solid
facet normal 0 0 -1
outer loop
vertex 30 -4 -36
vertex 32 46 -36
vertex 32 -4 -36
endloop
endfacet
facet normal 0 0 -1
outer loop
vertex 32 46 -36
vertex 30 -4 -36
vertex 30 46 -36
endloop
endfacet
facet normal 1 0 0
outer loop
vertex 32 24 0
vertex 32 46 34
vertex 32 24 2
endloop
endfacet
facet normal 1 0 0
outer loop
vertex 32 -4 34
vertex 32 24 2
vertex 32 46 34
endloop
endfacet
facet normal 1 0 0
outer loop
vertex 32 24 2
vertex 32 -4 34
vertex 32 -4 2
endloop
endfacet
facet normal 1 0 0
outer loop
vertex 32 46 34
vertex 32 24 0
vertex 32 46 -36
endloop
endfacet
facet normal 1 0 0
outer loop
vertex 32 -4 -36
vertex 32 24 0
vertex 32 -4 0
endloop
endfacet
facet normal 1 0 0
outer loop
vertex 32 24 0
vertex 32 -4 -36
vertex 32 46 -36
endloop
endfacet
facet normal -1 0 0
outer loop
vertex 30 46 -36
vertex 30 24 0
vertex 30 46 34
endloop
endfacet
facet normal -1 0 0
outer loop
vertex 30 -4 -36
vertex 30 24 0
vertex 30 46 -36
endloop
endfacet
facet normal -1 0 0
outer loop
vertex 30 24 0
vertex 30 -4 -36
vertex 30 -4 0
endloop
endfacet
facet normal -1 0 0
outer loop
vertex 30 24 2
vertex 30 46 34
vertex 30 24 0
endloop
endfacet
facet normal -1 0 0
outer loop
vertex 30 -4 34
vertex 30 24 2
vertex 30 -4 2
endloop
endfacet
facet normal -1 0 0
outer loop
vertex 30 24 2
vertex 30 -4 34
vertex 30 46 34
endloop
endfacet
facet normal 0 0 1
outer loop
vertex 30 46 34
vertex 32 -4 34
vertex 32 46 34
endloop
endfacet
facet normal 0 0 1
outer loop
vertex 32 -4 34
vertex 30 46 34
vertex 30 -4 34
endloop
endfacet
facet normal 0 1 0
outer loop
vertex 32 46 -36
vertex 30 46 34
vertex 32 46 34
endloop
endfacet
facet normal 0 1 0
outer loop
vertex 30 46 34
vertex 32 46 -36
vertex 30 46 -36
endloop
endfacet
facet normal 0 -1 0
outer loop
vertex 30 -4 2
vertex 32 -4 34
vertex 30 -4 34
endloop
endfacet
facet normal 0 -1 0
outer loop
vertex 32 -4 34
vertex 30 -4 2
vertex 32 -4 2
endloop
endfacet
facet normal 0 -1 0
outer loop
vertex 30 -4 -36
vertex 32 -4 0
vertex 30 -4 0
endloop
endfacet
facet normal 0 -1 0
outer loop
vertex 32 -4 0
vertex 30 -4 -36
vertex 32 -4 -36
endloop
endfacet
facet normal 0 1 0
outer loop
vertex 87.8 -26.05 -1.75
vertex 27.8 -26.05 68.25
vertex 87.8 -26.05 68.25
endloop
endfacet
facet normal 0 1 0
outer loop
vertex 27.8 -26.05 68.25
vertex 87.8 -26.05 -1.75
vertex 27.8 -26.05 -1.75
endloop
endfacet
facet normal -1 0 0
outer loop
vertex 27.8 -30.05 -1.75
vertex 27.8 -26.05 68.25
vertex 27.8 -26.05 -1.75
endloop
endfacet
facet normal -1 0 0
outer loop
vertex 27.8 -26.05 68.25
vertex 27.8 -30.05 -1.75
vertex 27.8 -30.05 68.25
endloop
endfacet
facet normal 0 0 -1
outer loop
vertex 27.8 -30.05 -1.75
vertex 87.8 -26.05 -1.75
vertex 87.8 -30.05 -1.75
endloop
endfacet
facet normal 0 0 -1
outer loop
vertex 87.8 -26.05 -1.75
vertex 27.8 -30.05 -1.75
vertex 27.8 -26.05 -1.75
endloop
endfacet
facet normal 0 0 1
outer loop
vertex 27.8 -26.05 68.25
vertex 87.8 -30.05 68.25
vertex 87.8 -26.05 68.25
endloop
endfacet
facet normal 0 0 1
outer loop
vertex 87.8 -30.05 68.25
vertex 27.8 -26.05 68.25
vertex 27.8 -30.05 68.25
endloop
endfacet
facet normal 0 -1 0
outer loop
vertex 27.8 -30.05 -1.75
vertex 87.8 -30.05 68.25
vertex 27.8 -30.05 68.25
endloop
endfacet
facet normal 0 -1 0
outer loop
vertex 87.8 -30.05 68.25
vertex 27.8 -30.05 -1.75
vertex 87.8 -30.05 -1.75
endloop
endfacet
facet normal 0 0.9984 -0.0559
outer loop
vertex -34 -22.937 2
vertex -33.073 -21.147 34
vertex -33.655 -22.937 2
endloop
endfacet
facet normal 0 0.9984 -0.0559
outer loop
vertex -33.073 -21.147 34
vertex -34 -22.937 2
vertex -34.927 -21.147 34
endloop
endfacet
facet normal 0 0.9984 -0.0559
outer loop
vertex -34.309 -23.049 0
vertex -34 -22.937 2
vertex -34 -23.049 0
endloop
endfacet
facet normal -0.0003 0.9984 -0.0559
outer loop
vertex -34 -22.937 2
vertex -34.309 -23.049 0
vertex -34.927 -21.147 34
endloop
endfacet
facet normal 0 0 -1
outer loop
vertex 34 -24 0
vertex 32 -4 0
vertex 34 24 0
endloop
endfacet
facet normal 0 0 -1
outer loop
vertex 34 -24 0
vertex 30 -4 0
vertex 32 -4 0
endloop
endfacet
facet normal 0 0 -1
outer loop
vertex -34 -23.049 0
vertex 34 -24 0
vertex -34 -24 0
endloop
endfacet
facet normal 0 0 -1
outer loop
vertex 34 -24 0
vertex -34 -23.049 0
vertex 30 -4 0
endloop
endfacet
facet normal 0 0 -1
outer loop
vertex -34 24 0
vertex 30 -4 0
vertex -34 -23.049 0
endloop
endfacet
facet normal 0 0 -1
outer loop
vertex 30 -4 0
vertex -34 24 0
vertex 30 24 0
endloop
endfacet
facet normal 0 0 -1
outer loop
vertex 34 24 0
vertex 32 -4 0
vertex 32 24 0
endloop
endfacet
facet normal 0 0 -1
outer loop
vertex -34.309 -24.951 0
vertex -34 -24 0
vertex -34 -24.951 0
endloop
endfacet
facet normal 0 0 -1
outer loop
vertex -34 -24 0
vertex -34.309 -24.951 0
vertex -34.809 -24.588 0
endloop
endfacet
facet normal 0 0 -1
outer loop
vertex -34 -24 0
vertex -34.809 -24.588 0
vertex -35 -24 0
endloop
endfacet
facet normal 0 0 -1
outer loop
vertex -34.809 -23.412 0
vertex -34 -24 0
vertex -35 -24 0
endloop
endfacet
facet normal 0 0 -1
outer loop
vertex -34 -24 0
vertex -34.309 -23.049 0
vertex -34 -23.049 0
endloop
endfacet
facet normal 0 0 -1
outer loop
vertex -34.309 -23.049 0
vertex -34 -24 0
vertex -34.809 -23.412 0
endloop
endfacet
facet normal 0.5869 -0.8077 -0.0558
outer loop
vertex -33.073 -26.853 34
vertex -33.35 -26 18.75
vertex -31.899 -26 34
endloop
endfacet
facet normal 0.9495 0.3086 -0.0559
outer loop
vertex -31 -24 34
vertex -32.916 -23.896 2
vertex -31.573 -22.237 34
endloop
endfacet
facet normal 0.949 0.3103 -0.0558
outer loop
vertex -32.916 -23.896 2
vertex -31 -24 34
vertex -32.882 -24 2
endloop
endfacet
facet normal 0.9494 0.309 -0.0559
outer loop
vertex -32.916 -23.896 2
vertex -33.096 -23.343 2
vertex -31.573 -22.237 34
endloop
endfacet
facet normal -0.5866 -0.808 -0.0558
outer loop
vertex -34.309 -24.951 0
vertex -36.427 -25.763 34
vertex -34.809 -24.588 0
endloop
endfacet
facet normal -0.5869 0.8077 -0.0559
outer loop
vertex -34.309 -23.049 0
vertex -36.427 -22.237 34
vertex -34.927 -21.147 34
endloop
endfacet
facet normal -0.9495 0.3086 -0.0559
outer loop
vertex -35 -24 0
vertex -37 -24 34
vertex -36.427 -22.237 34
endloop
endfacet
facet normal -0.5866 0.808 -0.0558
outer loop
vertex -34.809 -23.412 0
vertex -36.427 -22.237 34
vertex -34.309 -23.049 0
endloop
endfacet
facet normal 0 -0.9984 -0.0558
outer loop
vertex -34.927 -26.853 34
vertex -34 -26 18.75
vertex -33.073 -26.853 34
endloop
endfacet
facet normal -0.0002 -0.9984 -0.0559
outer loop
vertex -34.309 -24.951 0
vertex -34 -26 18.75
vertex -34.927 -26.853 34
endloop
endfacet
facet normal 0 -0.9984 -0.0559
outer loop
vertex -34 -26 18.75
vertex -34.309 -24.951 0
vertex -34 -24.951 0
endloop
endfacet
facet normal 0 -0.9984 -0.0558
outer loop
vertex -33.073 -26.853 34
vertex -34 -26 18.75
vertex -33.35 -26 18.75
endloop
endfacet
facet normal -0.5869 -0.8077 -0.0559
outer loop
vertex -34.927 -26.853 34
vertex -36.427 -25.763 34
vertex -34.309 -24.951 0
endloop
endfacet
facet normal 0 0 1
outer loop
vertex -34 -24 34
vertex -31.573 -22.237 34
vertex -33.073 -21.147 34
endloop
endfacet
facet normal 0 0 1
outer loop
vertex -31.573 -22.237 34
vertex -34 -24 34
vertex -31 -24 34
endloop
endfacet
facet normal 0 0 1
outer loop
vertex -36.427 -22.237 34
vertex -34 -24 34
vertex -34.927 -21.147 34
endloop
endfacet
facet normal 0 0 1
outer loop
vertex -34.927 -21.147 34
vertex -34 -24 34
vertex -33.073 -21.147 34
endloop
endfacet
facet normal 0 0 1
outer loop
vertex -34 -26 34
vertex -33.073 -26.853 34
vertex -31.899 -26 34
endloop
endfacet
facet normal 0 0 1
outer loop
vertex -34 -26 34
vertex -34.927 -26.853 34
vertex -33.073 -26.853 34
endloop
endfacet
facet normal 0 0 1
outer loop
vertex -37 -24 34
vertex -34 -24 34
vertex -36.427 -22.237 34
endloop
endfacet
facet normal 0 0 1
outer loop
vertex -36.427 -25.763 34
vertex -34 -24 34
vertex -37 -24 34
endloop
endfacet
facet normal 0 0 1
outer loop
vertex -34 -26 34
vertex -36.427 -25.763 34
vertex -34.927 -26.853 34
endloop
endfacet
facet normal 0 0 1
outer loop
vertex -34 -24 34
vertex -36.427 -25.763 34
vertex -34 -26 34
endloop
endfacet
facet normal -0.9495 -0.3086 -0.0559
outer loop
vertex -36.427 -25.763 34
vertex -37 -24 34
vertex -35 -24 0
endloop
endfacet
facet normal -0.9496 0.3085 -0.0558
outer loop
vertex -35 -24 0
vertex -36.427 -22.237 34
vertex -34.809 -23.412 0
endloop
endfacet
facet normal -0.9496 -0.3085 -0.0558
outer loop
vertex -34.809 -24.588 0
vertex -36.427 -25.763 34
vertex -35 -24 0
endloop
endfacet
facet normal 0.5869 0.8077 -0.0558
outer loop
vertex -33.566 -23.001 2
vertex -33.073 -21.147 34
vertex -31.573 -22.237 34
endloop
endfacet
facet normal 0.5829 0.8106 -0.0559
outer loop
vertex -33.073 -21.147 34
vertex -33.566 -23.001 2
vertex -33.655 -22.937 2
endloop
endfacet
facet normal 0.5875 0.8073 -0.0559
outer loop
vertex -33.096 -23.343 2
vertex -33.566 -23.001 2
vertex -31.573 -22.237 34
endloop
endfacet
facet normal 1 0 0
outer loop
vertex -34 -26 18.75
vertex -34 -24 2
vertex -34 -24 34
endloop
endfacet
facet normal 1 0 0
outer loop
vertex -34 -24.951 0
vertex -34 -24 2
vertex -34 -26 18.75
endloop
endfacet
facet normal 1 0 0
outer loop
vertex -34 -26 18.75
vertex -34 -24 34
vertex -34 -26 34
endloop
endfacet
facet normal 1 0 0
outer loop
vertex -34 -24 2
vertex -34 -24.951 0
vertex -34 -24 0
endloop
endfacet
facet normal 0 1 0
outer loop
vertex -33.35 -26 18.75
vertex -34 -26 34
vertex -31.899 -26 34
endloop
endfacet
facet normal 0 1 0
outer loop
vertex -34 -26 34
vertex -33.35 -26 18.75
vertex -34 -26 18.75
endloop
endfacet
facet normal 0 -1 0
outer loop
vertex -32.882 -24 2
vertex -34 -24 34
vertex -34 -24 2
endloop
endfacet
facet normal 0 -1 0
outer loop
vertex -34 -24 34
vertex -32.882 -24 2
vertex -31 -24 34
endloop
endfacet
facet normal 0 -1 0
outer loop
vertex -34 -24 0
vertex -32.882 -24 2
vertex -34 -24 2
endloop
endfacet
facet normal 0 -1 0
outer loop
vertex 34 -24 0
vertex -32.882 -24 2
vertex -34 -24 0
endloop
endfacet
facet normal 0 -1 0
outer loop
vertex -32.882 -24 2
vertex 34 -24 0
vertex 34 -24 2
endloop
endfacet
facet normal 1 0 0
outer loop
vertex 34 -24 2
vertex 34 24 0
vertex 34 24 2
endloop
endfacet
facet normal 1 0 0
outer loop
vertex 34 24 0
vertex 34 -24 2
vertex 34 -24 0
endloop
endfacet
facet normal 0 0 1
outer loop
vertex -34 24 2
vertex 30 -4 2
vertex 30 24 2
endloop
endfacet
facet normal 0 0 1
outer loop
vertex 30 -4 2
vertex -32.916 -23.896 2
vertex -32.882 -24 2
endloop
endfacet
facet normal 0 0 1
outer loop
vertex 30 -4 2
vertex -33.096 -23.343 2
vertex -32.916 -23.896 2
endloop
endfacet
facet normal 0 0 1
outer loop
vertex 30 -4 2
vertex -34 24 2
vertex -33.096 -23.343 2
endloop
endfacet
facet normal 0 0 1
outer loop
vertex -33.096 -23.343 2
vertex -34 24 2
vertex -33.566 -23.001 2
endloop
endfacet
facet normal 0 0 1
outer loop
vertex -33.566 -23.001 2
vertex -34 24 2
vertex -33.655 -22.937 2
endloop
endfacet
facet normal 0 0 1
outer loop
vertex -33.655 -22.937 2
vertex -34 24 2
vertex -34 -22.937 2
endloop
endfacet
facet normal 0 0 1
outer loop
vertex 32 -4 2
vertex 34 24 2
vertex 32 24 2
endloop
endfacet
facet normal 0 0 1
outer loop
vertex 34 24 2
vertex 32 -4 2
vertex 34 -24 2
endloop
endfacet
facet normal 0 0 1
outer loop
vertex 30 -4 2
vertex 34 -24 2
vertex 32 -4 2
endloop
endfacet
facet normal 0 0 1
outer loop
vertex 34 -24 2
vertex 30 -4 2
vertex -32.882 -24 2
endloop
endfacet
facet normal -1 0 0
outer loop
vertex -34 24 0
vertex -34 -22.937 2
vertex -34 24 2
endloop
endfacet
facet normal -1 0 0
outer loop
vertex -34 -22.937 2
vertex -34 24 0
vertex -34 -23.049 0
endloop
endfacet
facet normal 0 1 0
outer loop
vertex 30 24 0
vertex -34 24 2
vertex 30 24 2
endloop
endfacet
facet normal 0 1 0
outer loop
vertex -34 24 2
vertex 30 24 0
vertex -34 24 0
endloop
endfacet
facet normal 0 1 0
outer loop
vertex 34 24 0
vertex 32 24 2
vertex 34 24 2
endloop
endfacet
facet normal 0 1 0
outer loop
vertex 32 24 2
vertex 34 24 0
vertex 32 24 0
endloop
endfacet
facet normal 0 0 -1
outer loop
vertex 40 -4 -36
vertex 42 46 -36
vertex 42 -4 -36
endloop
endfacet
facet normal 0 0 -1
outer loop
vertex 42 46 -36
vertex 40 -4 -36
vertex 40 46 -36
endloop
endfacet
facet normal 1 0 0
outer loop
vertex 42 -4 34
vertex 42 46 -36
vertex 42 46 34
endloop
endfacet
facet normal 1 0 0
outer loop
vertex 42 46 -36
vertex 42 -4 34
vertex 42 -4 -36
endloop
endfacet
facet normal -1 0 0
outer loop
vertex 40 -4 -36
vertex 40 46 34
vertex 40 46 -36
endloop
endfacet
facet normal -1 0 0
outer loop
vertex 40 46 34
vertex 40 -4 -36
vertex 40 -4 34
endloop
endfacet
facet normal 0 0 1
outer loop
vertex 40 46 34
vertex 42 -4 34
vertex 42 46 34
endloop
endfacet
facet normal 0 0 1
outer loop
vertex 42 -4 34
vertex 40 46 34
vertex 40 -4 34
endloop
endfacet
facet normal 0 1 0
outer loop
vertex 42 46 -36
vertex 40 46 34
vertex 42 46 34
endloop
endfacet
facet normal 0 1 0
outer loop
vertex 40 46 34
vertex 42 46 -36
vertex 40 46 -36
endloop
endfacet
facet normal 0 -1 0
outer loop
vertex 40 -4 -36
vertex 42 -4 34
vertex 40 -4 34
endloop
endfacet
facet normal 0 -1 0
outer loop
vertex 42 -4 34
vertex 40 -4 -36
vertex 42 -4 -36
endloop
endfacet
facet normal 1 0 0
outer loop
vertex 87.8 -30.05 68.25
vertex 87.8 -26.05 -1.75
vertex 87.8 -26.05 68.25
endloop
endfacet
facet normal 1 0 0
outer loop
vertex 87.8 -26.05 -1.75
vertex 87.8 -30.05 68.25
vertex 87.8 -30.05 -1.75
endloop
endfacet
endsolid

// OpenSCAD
// Dimensions for Part 1: Box (outer size 70x50x30mm, walls=2mm, floor=2mm)
box_width = 70;      // Outer width
box_depth = 50;      // Outer depth
box_height = 30;     // Height

// Part 1: Box (open top)
module box() {
    translate([-box_width/2 + 1, -box_depth/2 + 1, 0]) {
        // Floor (2mm thick)
        cube([box_width - 2, box_depth - 2, 2]);

        // Walls (2mm thick)
        difference() {
            cylinder(h=box_height + 4, r1=1, r2=3);
            rotate([90, 0, 0])
                cube([box_width - 2, box_depth - 2, 2]);
        }
    }
}

// Dimensions for Part 2: Lid (plate + lip)
lid_plate_size = [70, 50];      // Plate dimensions
lid_lip_inner_size = [65.6, 45.6];
lid_lip_height = 4;
lid_lip_thickness = 1.5;

// Part 2: Lid (upside down)
module lid() {
    translate([-lid_plate_size[0]/2 + 1, -lid_plate_size[1]/2 + 1, 0]) {
        // Plate
        cube([lid_plate_size[0], lid_plate_size[1], 2]);

        // Lip (cut from plate)
        difference() {
            rotate([90, 0, 0])
                linear_extrude(height=lid_lip_height) {
                    polygon(points=[
                        [-lid_lip_inner_size[0]/2, -lid_lip_inner_size[1]/2],
                        [ lid_lip_inner_size[0]/2, -lid_lip_inner_size[1]/2],
                        [ lid_lip_inner_size[0]/2,  lid_lip_inner_size[1]/2],
                        [-lid_lip_inner_size[0]/2,  lid_lip_inner_size[1]/2]
                    ]);
                }
            rotate([90, 0, 0])
                linear_extrude(height=lid_lip_height) {
                    polygon(points=[
                        [-lid_plate_size[0]/2, -lid_plate_size[1]/2],
                        [ lid_plate_size[0]/2, -lid_plate_size[1]/2],
                        [ lid_plate_size[0]/2,  lid_plate_size[1]/2],
                        [-lid_plate_size[0]/2,  lid_plate_size[1]/2]
                    ]);
                }
        }

        // Cut out the lip material
        translate([-lid_lip_inner_size[0]/2 + lid_lip_thickness/2,
                  -lid_lip_inner_size[1]/2 + lid_lip_thickness/2, 0])
            rotate([90, 0, 0])
            linear_extrude(height=lid_lip_height) {
                polygon(points=[
                    [-lid_plate_size[0]/2 + lid_lip_inner_size[0]/2,
                     -lid_plate_size[1]/2 + lid_lip_inner_size[1]/2],
                    [ lid_plate_size[0]/2 + lid_lip_inner_size[0]/2,
                     -lid_plate_size[1]/2 + lid_lip_inner_size[1]/2],
                    [ lid_plate_size[0]/2 + lid_lip_inner_size[0]/2,
                      lid_plate_size[1]/2 + lid_lip_inner_size[1]/2],
                    [-lid_plate_size[0]/2 + lid_lip_inner_size[0]/2,
                      lid_plate_size[1]/2 + lid_lip_inner_size[1]/2]
                ]);
            }
    }
}

// Combined assembly: Box and Lid (10mm gap)
// Position box at origin, lid 10mm to the right
translate([box_width/2 - 5, box_depth/2 - 5, 0]) {
    rotate([0, 90, 0])
        lid();
}

union() {
    box();
    translate([box_width/2 + 5, box_depth/2 - 5, 0])
        rotate([0, 90, 0])
            lid();
}
